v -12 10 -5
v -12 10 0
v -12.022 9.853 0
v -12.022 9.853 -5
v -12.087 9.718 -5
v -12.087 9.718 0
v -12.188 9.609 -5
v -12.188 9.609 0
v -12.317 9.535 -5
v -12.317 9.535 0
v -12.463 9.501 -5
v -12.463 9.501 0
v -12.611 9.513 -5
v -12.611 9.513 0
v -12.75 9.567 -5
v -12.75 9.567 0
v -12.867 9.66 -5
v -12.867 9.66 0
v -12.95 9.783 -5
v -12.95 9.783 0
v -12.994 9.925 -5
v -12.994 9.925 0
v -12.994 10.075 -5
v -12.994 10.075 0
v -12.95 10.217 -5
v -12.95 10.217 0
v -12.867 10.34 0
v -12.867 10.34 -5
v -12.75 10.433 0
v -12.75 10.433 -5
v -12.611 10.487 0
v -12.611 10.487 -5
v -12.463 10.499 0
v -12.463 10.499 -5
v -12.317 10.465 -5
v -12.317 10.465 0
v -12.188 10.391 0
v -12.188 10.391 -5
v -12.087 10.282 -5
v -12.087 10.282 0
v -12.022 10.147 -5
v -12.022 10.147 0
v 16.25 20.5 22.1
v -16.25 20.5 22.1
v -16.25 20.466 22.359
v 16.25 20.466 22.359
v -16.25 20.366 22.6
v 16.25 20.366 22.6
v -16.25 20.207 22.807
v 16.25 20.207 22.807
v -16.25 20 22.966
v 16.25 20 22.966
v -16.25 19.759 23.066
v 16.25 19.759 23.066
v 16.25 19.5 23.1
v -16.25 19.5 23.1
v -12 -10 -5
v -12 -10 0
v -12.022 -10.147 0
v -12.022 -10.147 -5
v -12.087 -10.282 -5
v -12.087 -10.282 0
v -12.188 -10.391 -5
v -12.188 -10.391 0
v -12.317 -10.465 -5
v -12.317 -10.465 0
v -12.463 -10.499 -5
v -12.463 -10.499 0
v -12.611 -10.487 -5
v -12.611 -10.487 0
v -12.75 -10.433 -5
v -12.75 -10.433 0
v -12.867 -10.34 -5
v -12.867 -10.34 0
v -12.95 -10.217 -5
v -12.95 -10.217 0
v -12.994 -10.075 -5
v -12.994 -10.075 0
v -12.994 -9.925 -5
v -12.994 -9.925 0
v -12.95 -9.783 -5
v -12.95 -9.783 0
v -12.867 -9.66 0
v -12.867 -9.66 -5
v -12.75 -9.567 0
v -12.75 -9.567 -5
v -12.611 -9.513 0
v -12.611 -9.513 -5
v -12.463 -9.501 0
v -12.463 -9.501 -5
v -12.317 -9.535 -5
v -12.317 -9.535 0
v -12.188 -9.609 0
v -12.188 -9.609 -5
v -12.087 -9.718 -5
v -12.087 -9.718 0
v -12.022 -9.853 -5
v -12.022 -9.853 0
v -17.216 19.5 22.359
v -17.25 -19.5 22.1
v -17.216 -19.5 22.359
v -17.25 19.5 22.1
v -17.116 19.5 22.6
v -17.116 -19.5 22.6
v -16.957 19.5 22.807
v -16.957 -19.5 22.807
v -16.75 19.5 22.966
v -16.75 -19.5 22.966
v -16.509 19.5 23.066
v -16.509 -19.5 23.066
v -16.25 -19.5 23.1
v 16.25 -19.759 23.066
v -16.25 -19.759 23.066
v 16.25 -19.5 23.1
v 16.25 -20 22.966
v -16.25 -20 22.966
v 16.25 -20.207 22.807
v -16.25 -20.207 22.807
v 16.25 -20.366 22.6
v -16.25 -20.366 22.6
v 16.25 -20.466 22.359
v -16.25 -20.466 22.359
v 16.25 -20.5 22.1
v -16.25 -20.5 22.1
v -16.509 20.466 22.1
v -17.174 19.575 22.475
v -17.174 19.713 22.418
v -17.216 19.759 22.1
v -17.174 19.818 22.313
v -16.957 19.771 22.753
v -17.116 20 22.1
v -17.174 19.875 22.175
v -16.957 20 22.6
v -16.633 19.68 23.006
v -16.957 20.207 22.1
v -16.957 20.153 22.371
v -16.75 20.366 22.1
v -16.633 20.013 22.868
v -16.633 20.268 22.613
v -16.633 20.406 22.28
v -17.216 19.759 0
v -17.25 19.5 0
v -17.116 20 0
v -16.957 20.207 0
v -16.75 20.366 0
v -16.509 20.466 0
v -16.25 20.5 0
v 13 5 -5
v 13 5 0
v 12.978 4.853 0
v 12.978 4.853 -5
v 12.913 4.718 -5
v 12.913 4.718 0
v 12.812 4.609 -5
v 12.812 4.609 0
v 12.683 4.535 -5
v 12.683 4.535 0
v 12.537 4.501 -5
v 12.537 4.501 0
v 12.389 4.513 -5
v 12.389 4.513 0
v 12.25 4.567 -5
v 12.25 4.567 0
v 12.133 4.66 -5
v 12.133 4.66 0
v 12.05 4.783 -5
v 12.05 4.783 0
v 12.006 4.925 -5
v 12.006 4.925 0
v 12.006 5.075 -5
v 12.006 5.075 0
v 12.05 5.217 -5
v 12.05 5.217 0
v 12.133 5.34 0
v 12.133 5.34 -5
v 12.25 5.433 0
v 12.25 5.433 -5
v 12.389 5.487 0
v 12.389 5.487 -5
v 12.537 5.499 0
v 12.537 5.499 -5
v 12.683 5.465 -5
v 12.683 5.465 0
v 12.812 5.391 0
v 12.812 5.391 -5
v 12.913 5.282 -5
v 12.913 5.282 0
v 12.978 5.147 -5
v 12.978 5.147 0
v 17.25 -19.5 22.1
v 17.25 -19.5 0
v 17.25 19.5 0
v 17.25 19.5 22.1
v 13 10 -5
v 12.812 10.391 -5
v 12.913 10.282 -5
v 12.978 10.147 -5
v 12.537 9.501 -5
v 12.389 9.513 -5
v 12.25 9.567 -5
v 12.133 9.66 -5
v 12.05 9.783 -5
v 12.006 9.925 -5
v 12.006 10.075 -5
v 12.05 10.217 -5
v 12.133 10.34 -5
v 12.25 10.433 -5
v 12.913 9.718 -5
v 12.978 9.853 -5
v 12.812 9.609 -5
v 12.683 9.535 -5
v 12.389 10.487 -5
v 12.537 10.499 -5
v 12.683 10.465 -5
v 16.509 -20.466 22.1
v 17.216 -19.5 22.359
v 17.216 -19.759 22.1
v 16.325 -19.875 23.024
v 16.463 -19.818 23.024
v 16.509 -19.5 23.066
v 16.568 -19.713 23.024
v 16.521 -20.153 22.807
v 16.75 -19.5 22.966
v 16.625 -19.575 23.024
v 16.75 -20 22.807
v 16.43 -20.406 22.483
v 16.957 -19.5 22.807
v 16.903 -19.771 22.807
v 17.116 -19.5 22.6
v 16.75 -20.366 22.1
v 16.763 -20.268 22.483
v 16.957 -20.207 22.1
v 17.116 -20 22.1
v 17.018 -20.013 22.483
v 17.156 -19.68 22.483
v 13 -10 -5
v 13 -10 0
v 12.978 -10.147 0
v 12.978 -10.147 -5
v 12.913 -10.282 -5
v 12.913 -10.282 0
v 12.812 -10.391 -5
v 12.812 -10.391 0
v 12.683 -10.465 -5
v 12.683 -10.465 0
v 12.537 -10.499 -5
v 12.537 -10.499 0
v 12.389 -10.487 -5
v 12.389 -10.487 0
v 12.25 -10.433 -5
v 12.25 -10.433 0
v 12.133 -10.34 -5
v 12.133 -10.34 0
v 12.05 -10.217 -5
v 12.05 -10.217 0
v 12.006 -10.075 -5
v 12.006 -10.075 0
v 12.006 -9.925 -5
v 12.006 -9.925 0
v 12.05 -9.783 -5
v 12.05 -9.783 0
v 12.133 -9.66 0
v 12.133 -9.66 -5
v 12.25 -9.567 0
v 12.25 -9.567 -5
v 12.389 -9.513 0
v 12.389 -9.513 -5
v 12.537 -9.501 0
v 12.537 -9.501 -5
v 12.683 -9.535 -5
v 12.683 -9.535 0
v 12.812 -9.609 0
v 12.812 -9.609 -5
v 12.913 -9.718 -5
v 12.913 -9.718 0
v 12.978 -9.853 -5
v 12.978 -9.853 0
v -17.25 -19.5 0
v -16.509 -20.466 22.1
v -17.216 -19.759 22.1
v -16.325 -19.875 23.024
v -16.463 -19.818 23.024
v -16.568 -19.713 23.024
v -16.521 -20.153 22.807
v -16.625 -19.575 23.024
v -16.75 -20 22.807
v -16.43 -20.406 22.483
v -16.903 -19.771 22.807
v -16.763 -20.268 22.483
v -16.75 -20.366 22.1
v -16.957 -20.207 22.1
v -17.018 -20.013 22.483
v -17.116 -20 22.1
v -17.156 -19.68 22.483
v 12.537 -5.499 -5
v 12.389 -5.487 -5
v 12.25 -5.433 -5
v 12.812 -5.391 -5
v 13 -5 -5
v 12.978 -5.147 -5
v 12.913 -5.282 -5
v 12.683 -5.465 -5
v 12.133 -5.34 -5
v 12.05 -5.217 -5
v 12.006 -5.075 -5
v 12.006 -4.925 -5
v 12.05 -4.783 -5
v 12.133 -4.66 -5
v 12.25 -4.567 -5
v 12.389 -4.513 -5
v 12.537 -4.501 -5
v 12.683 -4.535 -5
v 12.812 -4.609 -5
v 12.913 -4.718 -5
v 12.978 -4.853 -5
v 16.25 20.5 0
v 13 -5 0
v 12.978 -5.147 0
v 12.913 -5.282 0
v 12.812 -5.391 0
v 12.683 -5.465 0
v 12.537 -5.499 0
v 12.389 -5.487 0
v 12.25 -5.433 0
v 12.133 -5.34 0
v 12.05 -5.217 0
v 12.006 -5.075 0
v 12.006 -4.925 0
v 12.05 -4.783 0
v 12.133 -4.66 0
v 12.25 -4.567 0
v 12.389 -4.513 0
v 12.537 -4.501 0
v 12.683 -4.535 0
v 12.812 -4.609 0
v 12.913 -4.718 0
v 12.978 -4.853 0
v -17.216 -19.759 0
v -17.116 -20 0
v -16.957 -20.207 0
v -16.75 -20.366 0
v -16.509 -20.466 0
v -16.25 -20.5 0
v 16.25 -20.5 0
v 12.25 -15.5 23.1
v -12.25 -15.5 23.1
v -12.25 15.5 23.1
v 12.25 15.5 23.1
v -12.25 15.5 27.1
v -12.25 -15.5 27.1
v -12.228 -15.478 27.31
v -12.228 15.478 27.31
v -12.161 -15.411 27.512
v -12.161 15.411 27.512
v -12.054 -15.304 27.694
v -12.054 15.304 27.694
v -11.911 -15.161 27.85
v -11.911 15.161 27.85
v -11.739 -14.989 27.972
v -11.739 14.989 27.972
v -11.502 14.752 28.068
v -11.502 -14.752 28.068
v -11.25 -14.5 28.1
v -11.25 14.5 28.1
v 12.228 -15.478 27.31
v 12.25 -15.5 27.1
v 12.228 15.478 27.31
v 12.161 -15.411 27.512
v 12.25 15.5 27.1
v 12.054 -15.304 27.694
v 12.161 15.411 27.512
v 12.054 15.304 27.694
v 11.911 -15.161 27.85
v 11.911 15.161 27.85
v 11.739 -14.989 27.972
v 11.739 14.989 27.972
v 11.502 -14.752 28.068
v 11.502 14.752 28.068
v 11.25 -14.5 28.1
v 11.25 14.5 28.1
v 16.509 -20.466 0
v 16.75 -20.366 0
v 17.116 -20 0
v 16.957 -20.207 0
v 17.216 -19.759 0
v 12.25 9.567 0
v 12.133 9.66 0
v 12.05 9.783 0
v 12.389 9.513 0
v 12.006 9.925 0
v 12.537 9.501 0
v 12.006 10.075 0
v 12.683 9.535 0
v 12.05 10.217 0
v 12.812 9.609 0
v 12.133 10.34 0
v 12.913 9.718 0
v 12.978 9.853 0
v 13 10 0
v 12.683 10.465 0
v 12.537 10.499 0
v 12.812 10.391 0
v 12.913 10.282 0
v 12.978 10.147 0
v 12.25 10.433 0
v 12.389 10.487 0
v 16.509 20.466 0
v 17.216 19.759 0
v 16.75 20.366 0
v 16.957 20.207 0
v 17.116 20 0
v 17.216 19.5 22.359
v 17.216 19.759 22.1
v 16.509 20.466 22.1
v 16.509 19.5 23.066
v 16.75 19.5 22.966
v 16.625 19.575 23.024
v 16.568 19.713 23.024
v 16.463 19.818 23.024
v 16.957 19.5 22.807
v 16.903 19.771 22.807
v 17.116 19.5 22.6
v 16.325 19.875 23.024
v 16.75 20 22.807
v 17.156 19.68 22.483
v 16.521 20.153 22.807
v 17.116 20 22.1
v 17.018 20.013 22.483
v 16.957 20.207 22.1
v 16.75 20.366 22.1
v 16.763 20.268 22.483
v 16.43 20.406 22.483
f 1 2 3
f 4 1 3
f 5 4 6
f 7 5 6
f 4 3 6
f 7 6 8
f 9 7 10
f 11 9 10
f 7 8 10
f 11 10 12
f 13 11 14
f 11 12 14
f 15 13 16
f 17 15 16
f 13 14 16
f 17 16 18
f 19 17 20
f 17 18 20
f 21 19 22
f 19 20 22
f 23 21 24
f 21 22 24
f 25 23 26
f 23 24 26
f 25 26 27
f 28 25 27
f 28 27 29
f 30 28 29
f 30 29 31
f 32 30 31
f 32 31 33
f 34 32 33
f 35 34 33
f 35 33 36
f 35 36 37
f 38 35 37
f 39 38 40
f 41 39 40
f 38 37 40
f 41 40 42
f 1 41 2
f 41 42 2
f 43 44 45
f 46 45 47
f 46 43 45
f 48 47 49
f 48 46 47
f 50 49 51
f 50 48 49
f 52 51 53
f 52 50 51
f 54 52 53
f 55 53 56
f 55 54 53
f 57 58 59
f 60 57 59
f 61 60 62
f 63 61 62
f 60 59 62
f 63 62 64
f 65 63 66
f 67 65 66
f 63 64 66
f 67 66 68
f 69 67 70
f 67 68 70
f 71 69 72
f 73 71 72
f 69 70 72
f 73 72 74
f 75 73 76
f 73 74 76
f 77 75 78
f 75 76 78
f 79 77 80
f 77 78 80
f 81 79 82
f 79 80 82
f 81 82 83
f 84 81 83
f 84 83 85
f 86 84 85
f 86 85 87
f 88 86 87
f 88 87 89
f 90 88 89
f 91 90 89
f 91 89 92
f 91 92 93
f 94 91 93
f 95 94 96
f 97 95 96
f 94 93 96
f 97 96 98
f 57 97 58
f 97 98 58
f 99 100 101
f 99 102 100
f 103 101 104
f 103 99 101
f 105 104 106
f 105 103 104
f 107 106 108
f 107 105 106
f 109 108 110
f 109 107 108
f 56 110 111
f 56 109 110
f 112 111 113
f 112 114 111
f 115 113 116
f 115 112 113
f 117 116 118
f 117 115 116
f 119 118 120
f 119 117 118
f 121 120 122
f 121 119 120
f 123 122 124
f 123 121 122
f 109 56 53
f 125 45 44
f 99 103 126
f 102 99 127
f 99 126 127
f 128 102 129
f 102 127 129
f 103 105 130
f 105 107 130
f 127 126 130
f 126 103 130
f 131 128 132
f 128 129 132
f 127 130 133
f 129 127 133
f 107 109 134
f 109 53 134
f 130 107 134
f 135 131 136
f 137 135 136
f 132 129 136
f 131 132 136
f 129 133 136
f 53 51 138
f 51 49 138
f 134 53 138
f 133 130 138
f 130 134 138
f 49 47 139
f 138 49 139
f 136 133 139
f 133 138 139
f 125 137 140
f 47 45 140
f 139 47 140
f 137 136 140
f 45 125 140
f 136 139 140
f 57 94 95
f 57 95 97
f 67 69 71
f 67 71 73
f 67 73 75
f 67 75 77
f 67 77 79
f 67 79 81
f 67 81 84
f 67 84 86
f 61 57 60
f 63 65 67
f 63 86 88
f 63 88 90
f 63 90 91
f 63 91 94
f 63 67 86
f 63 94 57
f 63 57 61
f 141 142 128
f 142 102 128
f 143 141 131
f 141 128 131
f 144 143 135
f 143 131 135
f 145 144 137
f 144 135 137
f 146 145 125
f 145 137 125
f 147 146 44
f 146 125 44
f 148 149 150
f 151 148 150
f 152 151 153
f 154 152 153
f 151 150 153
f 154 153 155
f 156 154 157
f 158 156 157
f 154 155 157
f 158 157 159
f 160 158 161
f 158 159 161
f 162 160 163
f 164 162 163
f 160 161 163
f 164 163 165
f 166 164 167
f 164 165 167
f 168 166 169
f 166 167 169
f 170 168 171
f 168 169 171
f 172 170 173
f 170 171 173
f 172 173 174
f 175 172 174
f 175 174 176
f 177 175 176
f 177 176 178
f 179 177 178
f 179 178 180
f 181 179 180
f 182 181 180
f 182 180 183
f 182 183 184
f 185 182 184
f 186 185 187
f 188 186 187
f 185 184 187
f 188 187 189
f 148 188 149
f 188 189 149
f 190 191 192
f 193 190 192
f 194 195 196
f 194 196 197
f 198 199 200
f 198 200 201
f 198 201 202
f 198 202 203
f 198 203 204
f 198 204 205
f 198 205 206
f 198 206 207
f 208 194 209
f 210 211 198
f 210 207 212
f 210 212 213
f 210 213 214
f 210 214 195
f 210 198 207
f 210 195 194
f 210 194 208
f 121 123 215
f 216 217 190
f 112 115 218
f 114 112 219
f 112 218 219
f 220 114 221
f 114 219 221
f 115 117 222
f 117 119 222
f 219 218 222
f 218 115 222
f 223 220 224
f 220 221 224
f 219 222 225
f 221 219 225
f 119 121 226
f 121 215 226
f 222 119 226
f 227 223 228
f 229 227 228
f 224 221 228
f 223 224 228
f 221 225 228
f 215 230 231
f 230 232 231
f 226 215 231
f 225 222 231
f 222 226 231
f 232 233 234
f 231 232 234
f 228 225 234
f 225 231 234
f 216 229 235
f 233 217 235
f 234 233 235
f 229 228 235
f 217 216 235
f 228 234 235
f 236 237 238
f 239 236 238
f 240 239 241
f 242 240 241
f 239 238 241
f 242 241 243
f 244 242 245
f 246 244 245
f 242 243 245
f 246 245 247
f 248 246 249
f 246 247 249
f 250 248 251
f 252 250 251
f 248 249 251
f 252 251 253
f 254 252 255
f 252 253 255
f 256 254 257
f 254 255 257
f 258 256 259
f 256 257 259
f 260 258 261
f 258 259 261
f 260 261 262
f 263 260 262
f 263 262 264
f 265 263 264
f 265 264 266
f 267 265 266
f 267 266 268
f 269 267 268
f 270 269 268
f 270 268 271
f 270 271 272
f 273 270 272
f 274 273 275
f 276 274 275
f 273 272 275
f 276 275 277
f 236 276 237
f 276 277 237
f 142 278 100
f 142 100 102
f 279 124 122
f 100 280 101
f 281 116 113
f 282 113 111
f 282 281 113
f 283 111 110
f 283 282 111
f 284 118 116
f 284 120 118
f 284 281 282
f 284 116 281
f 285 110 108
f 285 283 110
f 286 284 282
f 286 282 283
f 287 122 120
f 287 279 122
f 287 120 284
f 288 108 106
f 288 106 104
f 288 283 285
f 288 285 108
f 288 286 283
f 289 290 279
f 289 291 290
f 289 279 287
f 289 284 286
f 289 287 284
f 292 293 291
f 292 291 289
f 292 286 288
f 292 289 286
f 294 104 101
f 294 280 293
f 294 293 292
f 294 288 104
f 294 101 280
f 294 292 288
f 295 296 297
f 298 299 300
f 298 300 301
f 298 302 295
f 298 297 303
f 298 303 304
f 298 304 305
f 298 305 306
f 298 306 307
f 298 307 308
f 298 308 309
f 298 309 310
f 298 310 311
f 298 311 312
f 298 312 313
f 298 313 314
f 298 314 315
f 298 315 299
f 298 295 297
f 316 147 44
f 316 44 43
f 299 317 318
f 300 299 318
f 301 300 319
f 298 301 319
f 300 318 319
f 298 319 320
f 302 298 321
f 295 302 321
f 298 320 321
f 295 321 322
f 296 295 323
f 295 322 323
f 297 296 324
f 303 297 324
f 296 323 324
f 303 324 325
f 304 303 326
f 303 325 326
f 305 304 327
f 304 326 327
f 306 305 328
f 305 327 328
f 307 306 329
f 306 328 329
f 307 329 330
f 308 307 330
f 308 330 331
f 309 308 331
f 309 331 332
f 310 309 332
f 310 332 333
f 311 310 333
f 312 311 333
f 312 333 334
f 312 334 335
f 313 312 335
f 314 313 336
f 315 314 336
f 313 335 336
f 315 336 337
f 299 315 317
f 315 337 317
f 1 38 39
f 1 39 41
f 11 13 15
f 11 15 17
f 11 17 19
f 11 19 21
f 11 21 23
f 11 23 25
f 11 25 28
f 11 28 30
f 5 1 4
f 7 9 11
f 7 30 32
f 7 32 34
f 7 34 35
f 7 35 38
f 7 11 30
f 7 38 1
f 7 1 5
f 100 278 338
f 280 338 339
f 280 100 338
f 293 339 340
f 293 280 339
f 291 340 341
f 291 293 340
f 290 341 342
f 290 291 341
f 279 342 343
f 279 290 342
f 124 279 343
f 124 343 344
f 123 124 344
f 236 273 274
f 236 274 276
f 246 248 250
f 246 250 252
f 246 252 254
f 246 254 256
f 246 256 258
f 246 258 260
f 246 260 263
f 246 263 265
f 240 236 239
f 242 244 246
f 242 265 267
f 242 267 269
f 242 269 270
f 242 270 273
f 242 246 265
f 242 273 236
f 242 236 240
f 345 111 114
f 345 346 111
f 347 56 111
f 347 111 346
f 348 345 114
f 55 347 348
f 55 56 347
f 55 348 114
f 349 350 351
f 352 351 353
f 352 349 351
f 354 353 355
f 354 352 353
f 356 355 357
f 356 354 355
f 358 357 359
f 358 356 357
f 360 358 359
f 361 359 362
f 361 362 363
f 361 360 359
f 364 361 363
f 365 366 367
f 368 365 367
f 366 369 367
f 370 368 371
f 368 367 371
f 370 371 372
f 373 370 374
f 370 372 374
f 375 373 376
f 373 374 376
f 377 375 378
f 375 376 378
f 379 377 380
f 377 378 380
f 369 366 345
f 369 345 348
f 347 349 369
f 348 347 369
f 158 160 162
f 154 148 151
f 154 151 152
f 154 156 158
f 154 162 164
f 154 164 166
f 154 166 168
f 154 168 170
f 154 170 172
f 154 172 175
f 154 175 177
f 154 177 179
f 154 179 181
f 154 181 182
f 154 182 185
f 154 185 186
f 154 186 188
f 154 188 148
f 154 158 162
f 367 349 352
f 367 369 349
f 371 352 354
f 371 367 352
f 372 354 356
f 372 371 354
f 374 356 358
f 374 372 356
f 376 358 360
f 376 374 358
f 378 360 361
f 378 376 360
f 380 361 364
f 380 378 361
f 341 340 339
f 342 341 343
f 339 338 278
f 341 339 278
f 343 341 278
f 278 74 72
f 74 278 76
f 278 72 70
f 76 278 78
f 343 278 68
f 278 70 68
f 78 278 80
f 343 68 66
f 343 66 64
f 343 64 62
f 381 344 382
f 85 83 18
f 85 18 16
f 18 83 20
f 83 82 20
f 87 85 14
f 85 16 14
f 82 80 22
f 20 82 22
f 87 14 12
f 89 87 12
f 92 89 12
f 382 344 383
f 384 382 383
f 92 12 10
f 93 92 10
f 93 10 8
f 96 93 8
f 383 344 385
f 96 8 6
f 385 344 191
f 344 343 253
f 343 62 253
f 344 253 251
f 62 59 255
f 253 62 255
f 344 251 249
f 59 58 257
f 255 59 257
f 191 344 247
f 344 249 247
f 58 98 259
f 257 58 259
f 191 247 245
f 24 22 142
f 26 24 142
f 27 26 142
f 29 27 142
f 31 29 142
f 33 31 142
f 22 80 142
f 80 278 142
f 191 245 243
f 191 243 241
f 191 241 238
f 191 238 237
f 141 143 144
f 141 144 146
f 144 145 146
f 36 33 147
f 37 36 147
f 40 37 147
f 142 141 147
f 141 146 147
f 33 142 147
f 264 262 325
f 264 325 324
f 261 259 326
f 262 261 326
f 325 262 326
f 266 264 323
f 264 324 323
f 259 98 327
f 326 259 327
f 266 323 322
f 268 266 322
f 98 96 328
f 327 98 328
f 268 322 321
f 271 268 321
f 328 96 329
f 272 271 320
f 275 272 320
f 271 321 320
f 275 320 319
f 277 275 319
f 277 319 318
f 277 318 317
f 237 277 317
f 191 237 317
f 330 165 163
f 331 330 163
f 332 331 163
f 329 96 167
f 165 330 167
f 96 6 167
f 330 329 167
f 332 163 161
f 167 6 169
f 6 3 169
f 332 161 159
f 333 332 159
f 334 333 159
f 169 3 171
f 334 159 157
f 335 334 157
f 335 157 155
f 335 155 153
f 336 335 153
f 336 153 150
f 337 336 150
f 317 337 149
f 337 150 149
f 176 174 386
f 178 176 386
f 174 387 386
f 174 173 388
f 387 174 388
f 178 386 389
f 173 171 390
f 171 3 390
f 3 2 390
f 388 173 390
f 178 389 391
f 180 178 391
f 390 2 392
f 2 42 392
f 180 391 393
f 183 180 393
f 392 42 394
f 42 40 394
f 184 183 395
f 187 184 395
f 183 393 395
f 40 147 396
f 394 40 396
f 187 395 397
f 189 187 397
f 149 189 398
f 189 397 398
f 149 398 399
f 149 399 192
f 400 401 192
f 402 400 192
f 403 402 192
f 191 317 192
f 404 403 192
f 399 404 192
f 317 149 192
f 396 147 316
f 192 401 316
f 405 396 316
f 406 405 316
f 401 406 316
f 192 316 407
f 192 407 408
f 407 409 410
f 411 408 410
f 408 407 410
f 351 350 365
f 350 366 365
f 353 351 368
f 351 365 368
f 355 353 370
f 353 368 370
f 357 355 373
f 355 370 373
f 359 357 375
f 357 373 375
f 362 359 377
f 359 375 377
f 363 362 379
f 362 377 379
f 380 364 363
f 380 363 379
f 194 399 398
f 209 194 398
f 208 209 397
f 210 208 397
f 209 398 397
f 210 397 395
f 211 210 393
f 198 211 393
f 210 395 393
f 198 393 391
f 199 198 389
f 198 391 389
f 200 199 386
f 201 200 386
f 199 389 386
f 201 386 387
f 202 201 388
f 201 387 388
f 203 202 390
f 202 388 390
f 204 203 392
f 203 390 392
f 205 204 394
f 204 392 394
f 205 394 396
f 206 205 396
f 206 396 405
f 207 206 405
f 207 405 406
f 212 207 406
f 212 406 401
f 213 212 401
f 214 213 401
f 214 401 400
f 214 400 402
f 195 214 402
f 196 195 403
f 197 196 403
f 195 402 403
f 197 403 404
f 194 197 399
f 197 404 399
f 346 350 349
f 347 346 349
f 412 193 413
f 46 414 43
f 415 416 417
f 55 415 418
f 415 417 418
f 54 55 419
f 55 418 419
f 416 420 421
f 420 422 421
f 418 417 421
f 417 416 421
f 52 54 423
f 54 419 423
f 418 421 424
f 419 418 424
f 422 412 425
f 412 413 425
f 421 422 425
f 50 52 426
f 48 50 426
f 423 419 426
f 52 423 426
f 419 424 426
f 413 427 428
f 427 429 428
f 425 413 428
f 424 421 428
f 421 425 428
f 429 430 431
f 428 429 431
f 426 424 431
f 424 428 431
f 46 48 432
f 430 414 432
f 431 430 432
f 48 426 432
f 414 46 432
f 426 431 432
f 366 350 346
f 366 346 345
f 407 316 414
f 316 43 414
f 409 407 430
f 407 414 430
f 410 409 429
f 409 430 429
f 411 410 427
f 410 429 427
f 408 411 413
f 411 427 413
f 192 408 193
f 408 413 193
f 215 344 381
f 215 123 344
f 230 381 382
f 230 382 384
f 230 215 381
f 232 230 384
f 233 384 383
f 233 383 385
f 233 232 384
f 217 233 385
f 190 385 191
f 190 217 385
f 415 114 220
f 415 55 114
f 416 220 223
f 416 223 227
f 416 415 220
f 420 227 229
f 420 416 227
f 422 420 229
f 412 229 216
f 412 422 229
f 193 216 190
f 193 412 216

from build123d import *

# Parameters (mm, degrees)
F0_W     = 34.5
F0_H     = 41
F1_DEPTH = 28.1
F2_R     = 0.5
F3_DEPTH = 5
F4_W     = 34.5
F4_H     = 41
F4_W_2   = 24.5
F4_H_2   = 31
F5_DEPTH = 5
F6_R     = 1


with BuildPart() as f1:
    # F0 (on Top) → F1 (new body)
    with BuildSketch(Plane.XY):
        Rectangle(F0_W, F0_H)
    extrude(amount=F1_DEPTH)

    # F2 (on face) → F3 (join)
    with BuildSketch(Plane(origin=(0, 0, 0), x_dir=(1, 0, 0), z_dir=(0, 0, -1))):
        with Locations((-12.5, 10)):
            Circle(F2_R)
        with Locations((-12.5, -10)):
            Circle(F2_R)
        with Locations((12.5, 10)):
            Circle(F2_R)
        with Locations((12.5, -10)):
            Circle(F2_R)
        with Locations((12.5, -5)):
            Circle(F2_R)
        with Locations((12.5, 5)):
            Circle(F2_R)
    extrude(amount=F3_DEPTH)

    # F4 (on face) → F5 (cut)
    with BuildSketch(Plane.XY.offset(28.1)):
        Rectangle(F4_W, F4_H)
        Rectangle(F4_W_2, F4_H_2, mode=Mode.SUBTRACT)
    extrude(amount=-F5_DEPTH, mode=Mode.SUBTRACT)

    # F6
    f6_edges = [f1.edges().sort_by_distance(p)[0] for p in [
        (-12.25, 0, 28.1),
        (0, -15.5, 28.1),
        (12.25, 0, 28.1),
        (0, 15.5, 28.1),
        (17.25, -20.5, 11.55),
        (17.25, 20.5, 11.55),
        (-17.25, -20.5, 11.55),
        (0, -20.5, 23.1),
        (17.25, 0, 23.1),
        (0, 20.5, 23.1),
        (-17.25, 0, 23.1),
        (-17.25, 20.5, 11.55),
    ]]
    fillet(f6_edges, radius=F6_R)


solid = f1.part
